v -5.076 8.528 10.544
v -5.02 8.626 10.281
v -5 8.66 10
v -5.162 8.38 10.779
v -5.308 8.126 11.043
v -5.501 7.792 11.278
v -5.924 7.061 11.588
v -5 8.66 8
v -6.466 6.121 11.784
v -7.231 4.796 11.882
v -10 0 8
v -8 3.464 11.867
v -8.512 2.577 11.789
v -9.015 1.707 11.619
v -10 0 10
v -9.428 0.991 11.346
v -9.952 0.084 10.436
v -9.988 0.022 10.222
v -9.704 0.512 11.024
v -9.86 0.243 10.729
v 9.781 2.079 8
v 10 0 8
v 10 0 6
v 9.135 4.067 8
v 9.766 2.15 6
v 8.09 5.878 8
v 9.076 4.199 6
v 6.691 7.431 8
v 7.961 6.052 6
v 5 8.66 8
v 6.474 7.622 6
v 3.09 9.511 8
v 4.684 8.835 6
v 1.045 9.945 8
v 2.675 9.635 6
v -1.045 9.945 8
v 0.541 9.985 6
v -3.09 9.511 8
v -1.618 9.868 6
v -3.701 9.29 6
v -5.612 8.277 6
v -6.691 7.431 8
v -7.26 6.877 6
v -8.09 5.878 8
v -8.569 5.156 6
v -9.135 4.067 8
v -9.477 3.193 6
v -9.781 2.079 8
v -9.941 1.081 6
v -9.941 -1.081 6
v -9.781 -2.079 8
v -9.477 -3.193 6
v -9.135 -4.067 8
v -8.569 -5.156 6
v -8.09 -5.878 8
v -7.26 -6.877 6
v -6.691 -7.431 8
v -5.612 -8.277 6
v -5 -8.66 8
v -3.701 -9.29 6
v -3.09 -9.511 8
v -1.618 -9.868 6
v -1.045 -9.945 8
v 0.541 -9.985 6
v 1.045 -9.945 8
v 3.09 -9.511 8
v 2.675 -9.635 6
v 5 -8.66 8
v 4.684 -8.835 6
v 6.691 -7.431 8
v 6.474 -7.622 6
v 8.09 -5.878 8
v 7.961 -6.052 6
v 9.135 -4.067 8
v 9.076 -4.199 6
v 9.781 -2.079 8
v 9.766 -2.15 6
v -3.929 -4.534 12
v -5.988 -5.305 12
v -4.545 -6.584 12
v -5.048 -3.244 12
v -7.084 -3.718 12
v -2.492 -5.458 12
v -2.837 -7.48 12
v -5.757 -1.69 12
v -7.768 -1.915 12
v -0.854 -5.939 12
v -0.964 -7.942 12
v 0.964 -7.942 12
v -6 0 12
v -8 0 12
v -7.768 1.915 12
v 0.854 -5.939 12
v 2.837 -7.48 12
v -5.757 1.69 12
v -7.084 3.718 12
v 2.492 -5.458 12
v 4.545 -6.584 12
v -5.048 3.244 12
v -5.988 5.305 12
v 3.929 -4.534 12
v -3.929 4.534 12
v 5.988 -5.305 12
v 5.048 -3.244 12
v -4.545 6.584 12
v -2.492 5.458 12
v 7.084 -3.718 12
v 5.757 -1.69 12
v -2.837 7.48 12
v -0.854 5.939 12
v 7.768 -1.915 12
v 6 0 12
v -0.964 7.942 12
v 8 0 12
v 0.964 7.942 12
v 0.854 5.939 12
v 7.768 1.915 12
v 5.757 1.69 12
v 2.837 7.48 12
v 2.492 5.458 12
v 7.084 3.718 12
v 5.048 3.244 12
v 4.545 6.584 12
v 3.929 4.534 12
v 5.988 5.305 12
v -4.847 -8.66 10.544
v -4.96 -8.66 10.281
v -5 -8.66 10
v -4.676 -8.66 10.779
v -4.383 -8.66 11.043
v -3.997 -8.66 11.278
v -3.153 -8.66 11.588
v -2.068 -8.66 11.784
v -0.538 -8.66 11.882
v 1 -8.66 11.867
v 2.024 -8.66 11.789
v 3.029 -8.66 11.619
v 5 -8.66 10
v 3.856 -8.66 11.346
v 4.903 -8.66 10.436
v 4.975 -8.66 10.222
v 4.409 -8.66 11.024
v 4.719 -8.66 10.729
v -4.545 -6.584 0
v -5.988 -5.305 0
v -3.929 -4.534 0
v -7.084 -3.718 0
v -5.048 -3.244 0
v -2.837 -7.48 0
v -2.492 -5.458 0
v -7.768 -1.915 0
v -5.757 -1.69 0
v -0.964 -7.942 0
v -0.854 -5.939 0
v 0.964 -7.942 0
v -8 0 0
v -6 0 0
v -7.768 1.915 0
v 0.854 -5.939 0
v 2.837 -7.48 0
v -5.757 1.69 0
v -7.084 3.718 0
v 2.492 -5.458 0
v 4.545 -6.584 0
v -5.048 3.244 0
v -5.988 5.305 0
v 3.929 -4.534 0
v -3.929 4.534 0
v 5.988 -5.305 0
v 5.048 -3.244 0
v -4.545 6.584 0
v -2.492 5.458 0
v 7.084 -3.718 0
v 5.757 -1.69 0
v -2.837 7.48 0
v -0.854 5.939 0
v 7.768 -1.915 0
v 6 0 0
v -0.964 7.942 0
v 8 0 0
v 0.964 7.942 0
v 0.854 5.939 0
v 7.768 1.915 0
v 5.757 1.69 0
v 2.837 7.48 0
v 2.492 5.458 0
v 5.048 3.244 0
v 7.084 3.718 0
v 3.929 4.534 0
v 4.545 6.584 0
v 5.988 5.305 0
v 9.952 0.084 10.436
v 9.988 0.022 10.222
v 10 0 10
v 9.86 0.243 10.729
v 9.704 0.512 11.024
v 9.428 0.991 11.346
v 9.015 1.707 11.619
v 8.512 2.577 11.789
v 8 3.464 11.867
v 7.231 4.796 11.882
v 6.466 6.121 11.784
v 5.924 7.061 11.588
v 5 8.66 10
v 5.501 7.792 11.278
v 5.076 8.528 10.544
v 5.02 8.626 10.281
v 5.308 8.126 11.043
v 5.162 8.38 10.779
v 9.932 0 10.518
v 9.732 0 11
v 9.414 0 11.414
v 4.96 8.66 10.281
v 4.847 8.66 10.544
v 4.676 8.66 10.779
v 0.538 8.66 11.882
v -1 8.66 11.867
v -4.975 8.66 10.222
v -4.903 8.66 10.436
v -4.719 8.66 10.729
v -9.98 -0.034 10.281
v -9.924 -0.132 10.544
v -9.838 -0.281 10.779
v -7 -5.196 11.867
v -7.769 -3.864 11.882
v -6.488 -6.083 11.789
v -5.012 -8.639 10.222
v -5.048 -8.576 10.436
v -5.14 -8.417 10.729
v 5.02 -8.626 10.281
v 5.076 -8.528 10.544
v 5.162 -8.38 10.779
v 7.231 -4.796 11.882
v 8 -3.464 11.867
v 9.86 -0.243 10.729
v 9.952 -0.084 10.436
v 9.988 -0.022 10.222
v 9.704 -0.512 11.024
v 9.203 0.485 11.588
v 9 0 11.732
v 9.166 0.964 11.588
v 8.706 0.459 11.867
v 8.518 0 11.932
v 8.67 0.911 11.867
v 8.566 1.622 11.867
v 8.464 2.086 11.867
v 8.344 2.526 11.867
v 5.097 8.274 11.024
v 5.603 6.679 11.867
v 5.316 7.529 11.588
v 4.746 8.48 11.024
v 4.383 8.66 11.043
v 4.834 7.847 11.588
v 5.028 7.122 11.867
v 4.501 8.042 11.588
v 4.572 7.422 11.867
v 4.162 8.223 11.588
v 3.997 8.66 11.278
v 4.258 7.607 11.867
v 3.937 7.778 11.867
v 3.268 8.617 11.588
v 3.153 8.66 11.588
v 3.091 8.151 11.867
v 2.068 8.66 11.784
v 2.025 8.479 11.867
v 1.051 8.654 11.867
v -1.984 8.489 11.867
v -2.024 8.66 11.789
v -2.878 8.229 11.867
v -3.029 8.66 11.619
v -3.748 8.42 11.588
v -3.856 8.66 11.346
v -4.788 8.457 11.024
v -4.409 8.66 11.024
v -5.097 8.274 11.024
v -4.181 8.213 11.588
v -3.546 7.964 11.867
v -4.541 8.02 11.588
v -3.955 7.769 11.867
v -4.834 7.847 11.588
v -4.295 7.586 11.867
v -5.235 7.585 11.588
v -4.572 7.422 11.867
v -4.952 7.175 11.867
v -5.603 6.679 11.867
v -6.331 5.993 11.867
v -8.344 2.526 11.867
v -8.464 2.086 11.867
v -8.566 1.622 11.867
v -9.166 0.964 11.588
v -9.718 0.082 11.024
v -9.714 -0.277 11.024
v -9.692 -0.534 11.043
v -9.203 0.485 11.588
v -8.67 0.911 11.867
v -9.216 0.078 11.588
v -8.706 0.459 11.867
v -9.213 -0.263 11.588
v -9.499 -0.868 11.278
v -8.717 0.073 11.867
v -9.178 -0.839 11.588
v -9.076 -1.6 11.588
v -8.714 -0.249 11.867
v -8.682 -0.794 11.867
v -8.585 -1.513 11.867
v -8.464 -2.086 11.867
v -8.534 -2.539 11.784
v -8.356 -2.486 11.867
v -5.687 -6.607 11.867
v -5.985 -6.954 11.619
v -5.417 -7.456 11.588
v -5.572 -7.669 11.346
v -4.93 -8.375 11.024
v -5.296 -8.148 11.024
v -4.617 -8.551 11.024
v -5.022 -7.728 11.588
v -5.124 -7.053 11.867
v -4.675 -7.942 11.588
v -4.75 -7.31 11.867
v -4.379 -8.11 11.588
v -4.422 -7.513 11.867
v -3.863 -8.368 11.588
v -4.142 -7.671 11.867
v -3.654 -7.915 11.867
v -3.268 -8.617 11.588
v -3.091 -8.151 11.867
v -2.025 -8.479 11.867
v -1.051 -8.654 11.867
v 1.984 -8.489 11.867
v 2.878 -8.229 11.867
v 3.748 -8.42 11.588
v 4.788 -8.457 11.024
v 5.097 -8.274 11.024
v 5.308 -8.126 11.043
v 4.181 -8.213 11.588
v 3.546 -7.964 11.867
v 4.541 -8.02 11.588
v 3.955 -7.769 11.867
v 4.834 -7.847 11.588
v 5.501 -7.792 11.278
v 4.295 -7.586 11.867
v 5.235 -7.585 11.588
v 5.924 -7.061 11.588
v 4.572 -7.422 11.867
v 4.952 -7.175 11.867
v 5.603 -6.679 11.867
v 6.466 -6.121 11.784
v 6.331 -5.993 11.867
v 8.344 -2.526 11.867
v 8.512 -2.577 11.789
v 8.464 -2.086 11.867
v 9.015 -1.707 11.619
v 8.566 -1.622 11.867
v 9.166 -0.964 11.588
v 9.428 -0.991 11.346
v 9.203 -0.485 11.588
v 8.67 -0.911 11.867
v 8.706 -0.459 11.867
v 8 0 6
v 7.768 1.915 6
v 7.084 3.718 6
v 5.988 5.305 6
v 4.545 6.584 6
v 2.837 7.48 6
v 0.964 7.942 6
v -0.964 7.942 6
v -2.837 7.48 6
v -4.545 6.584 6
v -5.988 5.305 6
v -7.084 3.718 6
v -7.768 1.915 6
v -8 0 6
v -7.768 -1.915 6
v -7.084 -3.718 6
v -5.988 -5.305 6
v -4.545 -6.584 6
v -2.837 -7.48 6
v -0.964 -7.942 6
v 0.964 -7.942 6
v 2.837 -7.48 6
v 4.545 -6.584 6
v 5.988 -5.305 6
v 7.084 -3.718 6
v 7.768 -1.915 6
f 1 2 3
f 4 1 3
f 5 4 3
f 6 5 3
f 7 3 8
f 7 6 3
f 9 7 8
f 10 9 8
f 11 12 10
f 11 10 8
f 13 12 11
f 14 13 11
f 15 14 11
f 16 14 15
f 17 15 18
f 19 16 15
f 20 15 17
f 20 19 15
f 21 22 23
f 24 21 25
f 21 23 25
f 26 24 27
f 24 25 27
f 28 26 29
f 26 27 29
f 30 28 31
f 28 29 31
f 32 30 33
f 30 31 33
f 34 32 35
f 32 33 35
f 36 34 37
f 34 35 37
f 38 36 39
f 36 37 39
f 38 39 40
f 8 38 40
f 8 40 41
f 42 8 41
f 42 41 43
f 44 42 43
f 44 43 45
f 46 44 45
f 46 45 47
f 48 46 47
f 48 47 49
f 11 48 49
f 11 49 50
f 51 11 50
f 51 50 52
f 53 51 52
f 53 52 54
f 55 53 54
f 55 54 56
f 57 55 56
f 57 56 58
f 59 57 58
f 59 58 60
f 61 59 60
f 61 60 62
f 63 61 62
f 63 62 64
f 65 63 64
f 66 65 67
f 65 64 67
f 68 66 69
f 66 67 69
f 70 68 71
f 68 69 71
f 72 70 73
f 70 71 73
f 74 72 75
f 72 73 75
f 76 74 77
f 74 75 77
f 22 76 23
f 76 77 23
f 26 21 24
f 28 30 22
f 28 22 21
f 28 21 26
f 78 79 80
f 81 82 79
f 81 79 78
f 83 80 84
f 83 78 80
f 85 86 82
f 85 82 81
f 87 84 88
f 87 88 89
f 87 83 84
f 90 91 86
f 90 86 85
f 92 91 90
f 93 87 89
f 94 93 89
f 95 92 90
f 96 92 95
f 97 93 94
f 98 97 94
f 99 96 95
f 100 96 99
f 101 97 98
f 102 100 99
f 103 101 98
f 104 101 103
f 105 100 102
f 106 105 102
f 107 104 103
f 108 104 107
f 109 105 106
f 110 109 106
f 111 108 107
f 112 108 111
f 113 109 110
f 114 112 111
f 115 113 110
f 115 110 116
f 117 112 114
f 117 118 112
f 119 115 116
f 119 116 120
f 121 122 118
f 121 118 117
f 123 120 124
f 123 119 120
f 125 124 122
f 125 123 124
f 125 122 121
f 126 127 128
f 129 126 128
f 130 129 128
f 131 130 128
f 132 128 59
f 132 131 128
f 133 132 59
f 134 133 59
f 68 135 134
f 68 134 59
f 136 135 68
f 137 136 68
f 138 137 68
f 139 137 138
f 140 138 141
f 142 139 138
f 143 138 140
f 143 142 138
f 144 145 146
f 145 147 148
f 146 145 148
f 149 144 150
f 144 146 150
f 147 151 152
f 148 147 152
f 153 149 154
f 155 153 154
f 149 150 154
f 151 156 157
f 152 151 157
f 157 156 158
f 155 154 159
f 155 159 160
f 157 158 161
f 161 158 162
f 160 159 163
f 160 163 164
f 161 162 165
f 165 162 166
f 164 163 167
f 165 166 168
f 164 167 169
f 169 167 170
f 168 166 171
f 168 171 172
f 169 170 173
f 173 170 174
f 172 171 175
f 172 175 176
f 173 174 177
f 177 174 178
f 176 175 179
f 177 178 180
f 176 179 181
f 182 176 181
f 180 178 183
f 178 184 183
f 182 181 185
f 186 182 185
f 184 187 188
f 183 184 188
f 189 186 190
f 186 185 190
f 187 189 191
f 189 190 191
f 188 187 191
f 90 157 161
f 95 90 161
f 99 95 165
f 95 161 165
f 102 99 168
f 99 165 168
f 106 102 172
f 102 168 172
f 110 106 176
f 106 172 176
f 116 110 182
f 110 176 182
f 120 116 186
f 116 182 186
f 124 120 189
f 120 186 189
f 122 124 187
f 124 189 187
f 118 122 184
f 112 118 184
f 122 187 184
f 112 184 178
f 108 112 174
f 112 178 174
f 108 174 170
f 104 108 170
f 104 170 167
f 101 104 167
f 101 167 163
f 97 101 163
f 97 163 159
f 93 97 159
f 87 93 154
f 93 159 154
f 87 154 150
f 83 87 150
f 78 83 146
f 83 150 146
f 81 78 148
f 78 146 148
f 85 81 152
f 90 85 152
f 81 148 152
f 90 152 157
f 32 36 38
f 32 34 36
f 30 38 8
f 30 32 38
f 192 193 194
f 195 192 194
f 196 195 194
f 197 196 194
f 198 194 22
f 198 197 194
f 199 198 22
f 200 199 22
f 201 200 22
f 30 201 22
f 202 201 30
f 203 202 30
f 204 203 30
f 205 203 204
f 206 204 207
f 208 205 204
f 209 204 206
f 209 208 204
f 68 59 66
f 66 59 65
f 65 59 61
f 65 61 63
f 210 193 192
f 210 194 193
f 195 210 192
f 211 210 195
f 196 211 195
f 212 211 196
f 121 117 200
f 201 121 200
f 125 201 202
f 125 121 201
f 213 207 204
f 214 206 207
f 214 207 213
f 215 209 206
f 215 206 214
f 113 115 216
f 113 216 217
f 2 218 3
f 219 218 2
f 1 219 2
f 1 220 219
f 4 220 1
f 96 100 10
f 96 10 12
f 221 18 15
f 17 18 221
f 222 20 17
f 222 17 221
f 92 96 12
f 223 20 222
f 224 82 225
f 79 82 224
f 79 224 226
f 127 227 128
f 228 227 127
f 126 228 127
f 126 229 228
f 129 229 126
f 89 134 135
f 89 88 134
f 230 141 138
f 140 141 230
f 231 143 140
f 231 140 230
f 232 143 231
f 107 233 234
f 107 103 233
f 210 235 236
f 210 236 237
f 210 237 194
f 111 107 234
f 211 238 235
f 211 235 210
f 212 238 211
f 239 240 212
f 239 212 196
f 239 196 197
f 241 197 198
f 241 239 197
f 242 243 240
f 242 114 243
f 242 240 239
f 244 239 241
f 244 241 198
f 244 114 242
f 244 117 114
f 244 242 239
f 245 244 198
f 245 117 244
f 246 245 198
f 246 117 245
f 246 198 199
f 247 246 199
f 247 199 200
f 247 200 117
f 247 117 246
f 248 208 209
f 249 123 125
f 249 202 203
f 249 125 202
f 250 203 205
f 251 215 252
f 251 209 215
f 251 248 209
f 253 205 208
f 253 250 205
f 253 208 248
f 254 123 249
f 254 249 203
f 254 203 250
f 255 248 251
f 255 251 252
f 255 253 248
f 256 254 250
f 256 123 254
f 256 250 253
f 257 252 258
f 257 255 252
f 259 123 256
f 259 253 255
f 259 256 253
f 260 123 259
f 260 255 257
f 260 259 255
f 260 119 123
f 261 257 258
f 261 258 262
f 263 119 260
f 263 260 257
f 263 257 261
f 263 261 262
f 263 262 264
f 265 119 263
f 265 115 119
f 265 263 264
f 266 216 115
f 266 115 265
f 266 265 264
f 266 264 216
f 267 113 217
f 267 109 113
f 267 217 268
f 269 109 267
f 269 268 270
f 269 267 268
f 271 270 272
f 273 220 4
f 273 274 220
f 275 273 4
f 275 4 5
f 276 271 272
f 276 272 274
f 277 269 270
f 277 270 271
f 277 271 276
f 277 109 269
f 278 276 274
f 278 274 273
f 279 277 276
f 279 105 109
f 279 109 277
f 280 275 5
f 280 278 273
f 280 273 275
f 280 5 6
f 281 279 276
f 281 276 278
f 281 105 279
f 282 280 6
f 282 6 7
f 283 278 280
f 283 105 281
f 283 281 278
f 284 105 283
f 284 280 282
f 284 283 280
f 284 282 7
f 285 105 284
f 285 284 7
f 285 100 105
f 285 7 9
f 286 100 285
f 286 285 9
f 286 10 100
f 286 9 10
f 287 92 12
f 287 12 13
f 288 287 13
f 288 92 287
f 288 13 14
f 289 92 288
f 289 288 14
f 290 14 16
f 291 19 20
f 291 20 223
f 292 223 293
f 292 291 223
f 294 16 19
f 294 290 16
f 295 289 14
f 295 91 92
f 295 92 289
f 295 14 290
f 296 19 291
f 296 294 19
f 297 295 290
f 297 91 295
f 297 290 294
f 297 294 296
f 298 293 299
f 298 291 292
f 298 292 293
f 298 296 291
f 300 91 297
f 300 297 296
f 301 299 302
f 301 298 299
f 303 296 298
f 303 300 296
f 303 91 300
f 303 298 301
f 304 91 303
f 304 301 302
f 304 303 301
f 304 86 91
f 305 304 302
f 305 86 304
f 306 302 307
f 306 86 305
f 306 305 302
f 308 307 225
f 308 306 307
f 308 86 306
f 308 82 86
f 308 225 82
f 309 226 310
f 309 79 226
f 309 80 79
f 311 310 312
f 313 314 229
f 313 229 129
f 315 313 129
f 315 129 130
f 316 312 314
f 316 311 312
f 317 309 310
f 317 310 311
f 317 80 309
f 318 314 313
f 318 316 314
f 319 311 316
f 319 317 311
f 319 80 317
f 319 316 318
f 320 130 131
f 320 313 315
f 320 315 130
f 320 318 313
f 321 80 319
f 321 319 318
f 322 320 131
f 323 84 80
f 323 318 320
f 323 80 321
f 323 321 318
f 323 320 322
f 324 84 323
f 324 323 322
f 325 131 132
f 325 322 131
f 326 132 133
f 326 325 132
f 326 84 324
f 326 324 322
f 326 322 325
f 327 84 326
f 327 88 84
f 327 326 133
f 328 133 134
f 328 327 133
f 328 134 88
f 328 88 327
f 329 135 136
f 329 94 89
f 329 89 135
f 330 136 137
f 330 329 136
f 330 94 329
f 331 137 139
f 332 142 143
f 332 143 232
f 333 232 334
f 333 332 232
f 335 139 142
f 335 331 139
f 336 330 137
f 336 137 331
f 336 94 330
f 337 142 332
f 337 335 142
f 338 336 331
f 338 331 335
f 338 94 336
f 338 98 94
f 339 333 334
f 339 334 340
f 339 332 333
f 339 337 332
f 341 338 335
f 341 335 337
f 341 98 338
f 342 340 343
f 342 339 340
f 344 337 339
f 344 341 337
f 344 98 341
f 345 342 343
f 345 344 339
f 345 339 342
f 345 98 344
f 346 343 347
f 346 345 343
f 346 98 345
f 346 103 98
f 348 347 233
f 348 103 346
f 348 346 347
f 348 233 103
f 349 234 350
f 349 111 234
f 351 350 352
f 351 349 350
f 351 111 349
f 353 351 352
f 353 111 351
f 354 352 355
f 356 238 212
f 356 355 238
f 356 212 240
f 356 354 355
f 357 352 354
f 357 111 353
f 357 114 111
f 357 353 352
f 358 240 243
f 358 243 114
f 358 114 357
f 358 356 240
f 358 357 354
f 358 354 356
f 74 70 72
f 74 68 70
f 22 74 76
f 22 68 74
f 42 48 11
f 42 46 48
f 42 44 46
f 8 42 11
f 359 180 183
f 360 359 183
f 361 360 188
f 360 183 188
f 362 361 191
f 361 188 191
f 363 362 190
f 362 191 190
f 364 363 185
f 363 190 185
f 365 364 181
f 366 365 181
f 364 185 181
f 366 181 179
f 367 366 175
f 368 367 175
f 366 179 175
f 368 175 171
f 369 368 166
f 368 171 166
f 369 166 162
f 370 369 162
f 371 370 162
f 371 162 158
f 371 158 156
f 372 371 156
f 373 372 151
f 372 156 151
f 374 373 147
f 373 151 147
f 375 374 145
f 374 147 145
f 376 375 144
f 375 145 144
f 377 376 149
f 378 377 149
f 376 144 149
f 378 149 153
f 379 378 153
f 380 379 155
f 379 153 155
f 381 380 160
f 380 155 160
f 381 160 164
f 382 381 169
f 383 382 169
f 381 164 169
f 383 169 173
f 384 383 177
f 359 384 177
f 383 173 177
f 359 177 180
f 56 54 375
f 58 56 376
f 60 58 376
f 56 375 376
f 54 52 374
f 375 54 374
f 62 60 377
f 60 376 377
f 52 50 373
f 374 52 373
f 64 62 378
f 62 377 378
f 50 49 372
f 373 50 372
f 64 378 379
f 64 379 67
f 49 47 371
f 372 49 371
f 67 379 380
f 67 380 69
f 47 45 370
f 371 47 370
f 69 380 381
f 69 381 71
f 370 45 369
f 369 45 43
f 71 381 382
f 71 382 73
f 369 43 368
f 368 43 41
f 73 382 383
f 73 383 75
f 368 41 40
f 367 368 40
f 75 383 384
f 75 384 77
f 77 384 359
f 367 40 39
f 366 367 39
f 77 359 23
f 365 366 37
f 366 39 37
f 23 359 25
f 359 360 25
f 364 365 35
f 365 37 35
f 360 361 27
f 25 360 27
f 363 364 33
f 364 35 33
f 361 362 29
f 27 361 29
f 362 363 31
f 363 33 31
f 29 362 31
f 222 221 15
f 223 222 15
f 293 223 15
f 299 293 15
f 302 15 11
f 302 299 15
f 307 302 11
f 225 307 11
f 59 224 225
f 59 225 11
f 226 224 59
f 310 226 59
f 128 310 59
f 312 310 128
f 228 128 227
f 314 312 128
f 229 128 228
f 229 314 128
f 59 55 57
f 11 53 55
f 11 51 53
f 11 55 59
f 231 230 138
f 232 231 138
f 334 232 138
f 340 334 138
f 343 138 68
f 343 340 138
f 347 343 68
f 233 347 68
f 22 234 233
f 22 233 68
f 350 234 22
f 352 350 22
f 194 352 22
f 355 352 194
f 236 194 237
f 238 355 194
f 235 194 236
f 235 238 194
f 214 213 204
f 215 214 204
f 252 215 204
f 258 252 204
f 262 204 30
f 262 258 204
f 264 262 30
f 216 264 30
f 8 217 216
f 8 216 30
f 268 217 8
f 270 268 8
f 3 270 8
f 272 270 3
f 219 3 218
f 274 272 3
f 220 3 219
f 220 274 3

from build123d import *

# Parameters (mm, degrees)
SKETCH_1_R          = 8
EXTRUDE_1_DEPTH     = 6
SKETCH_2_R          = 10
EXTRUDE_2_DEPTH     = 6
FILLET_1_R          = 2
SKETCH_3_OUTSIDE_W  = 28.144
SKETCH_3_OUTSIDE_H  = 28.144
CUT_EXTRUDE_1_DEPTH = 4
SKETCH_4_R          = 6
CUT_EXTRUDE_2_DEPTH = 12


with BuildPart() as part:
    # 草图1 → 凸台-拉伸1 (new body)
    with BuildSketch(Plane.XY):
        Circle(SKETCH_1_R)
    extrude(amount=EXTRUDE_1_DEPTH)

    # 草图2 → 凸台-拉伸2 (add)
    with BuildSketch(Plane.XY.offset(6)):
        Circle(SKETCH_2_R)
    extrude(amount=EXTRUDE_2_DEPTH)

    # 圆角1
    fillet_1_edges = [part.edges().sort_by_distance(p)[0] for p in [
        (-10, 0, 12),
    ]]
    fillet(fillet_1_edges, radius=FILLET_1_R)

    # 草图3 outside → 切除-拉伸1 (cut)
    with BuildSketch(Plane.XY.offset(12)):
        Rectangle(SKETCH_3_OUTSIDE_W, SKETCH_3_OUTSIDE_H)
        Polygon((10, 0), (5, 8.660254038), (-5, 8.660254038), (-10, 0), (-5, -8.660254038), (5, -8.660254038), align=None, mode=Mode.SUBTRACT)
    extrude(amount=-CUT_EXTRUDE_1_DEPTH, mode=Mode.SUBTRACT)

    # 草图4 → 切除-拉伸2 (cut)
    with BuildSketch(Plane(origin=(0, 0, 0), x_dir=(-1, 0, 0), z_dir=(0, 0, -1))):
        Circle(SKETCH_4_R)
    extrude(amount=-CUT_EXTRUDE_2_DEPTH, mode=Mode.SUBTRACT)


solid = part.part
